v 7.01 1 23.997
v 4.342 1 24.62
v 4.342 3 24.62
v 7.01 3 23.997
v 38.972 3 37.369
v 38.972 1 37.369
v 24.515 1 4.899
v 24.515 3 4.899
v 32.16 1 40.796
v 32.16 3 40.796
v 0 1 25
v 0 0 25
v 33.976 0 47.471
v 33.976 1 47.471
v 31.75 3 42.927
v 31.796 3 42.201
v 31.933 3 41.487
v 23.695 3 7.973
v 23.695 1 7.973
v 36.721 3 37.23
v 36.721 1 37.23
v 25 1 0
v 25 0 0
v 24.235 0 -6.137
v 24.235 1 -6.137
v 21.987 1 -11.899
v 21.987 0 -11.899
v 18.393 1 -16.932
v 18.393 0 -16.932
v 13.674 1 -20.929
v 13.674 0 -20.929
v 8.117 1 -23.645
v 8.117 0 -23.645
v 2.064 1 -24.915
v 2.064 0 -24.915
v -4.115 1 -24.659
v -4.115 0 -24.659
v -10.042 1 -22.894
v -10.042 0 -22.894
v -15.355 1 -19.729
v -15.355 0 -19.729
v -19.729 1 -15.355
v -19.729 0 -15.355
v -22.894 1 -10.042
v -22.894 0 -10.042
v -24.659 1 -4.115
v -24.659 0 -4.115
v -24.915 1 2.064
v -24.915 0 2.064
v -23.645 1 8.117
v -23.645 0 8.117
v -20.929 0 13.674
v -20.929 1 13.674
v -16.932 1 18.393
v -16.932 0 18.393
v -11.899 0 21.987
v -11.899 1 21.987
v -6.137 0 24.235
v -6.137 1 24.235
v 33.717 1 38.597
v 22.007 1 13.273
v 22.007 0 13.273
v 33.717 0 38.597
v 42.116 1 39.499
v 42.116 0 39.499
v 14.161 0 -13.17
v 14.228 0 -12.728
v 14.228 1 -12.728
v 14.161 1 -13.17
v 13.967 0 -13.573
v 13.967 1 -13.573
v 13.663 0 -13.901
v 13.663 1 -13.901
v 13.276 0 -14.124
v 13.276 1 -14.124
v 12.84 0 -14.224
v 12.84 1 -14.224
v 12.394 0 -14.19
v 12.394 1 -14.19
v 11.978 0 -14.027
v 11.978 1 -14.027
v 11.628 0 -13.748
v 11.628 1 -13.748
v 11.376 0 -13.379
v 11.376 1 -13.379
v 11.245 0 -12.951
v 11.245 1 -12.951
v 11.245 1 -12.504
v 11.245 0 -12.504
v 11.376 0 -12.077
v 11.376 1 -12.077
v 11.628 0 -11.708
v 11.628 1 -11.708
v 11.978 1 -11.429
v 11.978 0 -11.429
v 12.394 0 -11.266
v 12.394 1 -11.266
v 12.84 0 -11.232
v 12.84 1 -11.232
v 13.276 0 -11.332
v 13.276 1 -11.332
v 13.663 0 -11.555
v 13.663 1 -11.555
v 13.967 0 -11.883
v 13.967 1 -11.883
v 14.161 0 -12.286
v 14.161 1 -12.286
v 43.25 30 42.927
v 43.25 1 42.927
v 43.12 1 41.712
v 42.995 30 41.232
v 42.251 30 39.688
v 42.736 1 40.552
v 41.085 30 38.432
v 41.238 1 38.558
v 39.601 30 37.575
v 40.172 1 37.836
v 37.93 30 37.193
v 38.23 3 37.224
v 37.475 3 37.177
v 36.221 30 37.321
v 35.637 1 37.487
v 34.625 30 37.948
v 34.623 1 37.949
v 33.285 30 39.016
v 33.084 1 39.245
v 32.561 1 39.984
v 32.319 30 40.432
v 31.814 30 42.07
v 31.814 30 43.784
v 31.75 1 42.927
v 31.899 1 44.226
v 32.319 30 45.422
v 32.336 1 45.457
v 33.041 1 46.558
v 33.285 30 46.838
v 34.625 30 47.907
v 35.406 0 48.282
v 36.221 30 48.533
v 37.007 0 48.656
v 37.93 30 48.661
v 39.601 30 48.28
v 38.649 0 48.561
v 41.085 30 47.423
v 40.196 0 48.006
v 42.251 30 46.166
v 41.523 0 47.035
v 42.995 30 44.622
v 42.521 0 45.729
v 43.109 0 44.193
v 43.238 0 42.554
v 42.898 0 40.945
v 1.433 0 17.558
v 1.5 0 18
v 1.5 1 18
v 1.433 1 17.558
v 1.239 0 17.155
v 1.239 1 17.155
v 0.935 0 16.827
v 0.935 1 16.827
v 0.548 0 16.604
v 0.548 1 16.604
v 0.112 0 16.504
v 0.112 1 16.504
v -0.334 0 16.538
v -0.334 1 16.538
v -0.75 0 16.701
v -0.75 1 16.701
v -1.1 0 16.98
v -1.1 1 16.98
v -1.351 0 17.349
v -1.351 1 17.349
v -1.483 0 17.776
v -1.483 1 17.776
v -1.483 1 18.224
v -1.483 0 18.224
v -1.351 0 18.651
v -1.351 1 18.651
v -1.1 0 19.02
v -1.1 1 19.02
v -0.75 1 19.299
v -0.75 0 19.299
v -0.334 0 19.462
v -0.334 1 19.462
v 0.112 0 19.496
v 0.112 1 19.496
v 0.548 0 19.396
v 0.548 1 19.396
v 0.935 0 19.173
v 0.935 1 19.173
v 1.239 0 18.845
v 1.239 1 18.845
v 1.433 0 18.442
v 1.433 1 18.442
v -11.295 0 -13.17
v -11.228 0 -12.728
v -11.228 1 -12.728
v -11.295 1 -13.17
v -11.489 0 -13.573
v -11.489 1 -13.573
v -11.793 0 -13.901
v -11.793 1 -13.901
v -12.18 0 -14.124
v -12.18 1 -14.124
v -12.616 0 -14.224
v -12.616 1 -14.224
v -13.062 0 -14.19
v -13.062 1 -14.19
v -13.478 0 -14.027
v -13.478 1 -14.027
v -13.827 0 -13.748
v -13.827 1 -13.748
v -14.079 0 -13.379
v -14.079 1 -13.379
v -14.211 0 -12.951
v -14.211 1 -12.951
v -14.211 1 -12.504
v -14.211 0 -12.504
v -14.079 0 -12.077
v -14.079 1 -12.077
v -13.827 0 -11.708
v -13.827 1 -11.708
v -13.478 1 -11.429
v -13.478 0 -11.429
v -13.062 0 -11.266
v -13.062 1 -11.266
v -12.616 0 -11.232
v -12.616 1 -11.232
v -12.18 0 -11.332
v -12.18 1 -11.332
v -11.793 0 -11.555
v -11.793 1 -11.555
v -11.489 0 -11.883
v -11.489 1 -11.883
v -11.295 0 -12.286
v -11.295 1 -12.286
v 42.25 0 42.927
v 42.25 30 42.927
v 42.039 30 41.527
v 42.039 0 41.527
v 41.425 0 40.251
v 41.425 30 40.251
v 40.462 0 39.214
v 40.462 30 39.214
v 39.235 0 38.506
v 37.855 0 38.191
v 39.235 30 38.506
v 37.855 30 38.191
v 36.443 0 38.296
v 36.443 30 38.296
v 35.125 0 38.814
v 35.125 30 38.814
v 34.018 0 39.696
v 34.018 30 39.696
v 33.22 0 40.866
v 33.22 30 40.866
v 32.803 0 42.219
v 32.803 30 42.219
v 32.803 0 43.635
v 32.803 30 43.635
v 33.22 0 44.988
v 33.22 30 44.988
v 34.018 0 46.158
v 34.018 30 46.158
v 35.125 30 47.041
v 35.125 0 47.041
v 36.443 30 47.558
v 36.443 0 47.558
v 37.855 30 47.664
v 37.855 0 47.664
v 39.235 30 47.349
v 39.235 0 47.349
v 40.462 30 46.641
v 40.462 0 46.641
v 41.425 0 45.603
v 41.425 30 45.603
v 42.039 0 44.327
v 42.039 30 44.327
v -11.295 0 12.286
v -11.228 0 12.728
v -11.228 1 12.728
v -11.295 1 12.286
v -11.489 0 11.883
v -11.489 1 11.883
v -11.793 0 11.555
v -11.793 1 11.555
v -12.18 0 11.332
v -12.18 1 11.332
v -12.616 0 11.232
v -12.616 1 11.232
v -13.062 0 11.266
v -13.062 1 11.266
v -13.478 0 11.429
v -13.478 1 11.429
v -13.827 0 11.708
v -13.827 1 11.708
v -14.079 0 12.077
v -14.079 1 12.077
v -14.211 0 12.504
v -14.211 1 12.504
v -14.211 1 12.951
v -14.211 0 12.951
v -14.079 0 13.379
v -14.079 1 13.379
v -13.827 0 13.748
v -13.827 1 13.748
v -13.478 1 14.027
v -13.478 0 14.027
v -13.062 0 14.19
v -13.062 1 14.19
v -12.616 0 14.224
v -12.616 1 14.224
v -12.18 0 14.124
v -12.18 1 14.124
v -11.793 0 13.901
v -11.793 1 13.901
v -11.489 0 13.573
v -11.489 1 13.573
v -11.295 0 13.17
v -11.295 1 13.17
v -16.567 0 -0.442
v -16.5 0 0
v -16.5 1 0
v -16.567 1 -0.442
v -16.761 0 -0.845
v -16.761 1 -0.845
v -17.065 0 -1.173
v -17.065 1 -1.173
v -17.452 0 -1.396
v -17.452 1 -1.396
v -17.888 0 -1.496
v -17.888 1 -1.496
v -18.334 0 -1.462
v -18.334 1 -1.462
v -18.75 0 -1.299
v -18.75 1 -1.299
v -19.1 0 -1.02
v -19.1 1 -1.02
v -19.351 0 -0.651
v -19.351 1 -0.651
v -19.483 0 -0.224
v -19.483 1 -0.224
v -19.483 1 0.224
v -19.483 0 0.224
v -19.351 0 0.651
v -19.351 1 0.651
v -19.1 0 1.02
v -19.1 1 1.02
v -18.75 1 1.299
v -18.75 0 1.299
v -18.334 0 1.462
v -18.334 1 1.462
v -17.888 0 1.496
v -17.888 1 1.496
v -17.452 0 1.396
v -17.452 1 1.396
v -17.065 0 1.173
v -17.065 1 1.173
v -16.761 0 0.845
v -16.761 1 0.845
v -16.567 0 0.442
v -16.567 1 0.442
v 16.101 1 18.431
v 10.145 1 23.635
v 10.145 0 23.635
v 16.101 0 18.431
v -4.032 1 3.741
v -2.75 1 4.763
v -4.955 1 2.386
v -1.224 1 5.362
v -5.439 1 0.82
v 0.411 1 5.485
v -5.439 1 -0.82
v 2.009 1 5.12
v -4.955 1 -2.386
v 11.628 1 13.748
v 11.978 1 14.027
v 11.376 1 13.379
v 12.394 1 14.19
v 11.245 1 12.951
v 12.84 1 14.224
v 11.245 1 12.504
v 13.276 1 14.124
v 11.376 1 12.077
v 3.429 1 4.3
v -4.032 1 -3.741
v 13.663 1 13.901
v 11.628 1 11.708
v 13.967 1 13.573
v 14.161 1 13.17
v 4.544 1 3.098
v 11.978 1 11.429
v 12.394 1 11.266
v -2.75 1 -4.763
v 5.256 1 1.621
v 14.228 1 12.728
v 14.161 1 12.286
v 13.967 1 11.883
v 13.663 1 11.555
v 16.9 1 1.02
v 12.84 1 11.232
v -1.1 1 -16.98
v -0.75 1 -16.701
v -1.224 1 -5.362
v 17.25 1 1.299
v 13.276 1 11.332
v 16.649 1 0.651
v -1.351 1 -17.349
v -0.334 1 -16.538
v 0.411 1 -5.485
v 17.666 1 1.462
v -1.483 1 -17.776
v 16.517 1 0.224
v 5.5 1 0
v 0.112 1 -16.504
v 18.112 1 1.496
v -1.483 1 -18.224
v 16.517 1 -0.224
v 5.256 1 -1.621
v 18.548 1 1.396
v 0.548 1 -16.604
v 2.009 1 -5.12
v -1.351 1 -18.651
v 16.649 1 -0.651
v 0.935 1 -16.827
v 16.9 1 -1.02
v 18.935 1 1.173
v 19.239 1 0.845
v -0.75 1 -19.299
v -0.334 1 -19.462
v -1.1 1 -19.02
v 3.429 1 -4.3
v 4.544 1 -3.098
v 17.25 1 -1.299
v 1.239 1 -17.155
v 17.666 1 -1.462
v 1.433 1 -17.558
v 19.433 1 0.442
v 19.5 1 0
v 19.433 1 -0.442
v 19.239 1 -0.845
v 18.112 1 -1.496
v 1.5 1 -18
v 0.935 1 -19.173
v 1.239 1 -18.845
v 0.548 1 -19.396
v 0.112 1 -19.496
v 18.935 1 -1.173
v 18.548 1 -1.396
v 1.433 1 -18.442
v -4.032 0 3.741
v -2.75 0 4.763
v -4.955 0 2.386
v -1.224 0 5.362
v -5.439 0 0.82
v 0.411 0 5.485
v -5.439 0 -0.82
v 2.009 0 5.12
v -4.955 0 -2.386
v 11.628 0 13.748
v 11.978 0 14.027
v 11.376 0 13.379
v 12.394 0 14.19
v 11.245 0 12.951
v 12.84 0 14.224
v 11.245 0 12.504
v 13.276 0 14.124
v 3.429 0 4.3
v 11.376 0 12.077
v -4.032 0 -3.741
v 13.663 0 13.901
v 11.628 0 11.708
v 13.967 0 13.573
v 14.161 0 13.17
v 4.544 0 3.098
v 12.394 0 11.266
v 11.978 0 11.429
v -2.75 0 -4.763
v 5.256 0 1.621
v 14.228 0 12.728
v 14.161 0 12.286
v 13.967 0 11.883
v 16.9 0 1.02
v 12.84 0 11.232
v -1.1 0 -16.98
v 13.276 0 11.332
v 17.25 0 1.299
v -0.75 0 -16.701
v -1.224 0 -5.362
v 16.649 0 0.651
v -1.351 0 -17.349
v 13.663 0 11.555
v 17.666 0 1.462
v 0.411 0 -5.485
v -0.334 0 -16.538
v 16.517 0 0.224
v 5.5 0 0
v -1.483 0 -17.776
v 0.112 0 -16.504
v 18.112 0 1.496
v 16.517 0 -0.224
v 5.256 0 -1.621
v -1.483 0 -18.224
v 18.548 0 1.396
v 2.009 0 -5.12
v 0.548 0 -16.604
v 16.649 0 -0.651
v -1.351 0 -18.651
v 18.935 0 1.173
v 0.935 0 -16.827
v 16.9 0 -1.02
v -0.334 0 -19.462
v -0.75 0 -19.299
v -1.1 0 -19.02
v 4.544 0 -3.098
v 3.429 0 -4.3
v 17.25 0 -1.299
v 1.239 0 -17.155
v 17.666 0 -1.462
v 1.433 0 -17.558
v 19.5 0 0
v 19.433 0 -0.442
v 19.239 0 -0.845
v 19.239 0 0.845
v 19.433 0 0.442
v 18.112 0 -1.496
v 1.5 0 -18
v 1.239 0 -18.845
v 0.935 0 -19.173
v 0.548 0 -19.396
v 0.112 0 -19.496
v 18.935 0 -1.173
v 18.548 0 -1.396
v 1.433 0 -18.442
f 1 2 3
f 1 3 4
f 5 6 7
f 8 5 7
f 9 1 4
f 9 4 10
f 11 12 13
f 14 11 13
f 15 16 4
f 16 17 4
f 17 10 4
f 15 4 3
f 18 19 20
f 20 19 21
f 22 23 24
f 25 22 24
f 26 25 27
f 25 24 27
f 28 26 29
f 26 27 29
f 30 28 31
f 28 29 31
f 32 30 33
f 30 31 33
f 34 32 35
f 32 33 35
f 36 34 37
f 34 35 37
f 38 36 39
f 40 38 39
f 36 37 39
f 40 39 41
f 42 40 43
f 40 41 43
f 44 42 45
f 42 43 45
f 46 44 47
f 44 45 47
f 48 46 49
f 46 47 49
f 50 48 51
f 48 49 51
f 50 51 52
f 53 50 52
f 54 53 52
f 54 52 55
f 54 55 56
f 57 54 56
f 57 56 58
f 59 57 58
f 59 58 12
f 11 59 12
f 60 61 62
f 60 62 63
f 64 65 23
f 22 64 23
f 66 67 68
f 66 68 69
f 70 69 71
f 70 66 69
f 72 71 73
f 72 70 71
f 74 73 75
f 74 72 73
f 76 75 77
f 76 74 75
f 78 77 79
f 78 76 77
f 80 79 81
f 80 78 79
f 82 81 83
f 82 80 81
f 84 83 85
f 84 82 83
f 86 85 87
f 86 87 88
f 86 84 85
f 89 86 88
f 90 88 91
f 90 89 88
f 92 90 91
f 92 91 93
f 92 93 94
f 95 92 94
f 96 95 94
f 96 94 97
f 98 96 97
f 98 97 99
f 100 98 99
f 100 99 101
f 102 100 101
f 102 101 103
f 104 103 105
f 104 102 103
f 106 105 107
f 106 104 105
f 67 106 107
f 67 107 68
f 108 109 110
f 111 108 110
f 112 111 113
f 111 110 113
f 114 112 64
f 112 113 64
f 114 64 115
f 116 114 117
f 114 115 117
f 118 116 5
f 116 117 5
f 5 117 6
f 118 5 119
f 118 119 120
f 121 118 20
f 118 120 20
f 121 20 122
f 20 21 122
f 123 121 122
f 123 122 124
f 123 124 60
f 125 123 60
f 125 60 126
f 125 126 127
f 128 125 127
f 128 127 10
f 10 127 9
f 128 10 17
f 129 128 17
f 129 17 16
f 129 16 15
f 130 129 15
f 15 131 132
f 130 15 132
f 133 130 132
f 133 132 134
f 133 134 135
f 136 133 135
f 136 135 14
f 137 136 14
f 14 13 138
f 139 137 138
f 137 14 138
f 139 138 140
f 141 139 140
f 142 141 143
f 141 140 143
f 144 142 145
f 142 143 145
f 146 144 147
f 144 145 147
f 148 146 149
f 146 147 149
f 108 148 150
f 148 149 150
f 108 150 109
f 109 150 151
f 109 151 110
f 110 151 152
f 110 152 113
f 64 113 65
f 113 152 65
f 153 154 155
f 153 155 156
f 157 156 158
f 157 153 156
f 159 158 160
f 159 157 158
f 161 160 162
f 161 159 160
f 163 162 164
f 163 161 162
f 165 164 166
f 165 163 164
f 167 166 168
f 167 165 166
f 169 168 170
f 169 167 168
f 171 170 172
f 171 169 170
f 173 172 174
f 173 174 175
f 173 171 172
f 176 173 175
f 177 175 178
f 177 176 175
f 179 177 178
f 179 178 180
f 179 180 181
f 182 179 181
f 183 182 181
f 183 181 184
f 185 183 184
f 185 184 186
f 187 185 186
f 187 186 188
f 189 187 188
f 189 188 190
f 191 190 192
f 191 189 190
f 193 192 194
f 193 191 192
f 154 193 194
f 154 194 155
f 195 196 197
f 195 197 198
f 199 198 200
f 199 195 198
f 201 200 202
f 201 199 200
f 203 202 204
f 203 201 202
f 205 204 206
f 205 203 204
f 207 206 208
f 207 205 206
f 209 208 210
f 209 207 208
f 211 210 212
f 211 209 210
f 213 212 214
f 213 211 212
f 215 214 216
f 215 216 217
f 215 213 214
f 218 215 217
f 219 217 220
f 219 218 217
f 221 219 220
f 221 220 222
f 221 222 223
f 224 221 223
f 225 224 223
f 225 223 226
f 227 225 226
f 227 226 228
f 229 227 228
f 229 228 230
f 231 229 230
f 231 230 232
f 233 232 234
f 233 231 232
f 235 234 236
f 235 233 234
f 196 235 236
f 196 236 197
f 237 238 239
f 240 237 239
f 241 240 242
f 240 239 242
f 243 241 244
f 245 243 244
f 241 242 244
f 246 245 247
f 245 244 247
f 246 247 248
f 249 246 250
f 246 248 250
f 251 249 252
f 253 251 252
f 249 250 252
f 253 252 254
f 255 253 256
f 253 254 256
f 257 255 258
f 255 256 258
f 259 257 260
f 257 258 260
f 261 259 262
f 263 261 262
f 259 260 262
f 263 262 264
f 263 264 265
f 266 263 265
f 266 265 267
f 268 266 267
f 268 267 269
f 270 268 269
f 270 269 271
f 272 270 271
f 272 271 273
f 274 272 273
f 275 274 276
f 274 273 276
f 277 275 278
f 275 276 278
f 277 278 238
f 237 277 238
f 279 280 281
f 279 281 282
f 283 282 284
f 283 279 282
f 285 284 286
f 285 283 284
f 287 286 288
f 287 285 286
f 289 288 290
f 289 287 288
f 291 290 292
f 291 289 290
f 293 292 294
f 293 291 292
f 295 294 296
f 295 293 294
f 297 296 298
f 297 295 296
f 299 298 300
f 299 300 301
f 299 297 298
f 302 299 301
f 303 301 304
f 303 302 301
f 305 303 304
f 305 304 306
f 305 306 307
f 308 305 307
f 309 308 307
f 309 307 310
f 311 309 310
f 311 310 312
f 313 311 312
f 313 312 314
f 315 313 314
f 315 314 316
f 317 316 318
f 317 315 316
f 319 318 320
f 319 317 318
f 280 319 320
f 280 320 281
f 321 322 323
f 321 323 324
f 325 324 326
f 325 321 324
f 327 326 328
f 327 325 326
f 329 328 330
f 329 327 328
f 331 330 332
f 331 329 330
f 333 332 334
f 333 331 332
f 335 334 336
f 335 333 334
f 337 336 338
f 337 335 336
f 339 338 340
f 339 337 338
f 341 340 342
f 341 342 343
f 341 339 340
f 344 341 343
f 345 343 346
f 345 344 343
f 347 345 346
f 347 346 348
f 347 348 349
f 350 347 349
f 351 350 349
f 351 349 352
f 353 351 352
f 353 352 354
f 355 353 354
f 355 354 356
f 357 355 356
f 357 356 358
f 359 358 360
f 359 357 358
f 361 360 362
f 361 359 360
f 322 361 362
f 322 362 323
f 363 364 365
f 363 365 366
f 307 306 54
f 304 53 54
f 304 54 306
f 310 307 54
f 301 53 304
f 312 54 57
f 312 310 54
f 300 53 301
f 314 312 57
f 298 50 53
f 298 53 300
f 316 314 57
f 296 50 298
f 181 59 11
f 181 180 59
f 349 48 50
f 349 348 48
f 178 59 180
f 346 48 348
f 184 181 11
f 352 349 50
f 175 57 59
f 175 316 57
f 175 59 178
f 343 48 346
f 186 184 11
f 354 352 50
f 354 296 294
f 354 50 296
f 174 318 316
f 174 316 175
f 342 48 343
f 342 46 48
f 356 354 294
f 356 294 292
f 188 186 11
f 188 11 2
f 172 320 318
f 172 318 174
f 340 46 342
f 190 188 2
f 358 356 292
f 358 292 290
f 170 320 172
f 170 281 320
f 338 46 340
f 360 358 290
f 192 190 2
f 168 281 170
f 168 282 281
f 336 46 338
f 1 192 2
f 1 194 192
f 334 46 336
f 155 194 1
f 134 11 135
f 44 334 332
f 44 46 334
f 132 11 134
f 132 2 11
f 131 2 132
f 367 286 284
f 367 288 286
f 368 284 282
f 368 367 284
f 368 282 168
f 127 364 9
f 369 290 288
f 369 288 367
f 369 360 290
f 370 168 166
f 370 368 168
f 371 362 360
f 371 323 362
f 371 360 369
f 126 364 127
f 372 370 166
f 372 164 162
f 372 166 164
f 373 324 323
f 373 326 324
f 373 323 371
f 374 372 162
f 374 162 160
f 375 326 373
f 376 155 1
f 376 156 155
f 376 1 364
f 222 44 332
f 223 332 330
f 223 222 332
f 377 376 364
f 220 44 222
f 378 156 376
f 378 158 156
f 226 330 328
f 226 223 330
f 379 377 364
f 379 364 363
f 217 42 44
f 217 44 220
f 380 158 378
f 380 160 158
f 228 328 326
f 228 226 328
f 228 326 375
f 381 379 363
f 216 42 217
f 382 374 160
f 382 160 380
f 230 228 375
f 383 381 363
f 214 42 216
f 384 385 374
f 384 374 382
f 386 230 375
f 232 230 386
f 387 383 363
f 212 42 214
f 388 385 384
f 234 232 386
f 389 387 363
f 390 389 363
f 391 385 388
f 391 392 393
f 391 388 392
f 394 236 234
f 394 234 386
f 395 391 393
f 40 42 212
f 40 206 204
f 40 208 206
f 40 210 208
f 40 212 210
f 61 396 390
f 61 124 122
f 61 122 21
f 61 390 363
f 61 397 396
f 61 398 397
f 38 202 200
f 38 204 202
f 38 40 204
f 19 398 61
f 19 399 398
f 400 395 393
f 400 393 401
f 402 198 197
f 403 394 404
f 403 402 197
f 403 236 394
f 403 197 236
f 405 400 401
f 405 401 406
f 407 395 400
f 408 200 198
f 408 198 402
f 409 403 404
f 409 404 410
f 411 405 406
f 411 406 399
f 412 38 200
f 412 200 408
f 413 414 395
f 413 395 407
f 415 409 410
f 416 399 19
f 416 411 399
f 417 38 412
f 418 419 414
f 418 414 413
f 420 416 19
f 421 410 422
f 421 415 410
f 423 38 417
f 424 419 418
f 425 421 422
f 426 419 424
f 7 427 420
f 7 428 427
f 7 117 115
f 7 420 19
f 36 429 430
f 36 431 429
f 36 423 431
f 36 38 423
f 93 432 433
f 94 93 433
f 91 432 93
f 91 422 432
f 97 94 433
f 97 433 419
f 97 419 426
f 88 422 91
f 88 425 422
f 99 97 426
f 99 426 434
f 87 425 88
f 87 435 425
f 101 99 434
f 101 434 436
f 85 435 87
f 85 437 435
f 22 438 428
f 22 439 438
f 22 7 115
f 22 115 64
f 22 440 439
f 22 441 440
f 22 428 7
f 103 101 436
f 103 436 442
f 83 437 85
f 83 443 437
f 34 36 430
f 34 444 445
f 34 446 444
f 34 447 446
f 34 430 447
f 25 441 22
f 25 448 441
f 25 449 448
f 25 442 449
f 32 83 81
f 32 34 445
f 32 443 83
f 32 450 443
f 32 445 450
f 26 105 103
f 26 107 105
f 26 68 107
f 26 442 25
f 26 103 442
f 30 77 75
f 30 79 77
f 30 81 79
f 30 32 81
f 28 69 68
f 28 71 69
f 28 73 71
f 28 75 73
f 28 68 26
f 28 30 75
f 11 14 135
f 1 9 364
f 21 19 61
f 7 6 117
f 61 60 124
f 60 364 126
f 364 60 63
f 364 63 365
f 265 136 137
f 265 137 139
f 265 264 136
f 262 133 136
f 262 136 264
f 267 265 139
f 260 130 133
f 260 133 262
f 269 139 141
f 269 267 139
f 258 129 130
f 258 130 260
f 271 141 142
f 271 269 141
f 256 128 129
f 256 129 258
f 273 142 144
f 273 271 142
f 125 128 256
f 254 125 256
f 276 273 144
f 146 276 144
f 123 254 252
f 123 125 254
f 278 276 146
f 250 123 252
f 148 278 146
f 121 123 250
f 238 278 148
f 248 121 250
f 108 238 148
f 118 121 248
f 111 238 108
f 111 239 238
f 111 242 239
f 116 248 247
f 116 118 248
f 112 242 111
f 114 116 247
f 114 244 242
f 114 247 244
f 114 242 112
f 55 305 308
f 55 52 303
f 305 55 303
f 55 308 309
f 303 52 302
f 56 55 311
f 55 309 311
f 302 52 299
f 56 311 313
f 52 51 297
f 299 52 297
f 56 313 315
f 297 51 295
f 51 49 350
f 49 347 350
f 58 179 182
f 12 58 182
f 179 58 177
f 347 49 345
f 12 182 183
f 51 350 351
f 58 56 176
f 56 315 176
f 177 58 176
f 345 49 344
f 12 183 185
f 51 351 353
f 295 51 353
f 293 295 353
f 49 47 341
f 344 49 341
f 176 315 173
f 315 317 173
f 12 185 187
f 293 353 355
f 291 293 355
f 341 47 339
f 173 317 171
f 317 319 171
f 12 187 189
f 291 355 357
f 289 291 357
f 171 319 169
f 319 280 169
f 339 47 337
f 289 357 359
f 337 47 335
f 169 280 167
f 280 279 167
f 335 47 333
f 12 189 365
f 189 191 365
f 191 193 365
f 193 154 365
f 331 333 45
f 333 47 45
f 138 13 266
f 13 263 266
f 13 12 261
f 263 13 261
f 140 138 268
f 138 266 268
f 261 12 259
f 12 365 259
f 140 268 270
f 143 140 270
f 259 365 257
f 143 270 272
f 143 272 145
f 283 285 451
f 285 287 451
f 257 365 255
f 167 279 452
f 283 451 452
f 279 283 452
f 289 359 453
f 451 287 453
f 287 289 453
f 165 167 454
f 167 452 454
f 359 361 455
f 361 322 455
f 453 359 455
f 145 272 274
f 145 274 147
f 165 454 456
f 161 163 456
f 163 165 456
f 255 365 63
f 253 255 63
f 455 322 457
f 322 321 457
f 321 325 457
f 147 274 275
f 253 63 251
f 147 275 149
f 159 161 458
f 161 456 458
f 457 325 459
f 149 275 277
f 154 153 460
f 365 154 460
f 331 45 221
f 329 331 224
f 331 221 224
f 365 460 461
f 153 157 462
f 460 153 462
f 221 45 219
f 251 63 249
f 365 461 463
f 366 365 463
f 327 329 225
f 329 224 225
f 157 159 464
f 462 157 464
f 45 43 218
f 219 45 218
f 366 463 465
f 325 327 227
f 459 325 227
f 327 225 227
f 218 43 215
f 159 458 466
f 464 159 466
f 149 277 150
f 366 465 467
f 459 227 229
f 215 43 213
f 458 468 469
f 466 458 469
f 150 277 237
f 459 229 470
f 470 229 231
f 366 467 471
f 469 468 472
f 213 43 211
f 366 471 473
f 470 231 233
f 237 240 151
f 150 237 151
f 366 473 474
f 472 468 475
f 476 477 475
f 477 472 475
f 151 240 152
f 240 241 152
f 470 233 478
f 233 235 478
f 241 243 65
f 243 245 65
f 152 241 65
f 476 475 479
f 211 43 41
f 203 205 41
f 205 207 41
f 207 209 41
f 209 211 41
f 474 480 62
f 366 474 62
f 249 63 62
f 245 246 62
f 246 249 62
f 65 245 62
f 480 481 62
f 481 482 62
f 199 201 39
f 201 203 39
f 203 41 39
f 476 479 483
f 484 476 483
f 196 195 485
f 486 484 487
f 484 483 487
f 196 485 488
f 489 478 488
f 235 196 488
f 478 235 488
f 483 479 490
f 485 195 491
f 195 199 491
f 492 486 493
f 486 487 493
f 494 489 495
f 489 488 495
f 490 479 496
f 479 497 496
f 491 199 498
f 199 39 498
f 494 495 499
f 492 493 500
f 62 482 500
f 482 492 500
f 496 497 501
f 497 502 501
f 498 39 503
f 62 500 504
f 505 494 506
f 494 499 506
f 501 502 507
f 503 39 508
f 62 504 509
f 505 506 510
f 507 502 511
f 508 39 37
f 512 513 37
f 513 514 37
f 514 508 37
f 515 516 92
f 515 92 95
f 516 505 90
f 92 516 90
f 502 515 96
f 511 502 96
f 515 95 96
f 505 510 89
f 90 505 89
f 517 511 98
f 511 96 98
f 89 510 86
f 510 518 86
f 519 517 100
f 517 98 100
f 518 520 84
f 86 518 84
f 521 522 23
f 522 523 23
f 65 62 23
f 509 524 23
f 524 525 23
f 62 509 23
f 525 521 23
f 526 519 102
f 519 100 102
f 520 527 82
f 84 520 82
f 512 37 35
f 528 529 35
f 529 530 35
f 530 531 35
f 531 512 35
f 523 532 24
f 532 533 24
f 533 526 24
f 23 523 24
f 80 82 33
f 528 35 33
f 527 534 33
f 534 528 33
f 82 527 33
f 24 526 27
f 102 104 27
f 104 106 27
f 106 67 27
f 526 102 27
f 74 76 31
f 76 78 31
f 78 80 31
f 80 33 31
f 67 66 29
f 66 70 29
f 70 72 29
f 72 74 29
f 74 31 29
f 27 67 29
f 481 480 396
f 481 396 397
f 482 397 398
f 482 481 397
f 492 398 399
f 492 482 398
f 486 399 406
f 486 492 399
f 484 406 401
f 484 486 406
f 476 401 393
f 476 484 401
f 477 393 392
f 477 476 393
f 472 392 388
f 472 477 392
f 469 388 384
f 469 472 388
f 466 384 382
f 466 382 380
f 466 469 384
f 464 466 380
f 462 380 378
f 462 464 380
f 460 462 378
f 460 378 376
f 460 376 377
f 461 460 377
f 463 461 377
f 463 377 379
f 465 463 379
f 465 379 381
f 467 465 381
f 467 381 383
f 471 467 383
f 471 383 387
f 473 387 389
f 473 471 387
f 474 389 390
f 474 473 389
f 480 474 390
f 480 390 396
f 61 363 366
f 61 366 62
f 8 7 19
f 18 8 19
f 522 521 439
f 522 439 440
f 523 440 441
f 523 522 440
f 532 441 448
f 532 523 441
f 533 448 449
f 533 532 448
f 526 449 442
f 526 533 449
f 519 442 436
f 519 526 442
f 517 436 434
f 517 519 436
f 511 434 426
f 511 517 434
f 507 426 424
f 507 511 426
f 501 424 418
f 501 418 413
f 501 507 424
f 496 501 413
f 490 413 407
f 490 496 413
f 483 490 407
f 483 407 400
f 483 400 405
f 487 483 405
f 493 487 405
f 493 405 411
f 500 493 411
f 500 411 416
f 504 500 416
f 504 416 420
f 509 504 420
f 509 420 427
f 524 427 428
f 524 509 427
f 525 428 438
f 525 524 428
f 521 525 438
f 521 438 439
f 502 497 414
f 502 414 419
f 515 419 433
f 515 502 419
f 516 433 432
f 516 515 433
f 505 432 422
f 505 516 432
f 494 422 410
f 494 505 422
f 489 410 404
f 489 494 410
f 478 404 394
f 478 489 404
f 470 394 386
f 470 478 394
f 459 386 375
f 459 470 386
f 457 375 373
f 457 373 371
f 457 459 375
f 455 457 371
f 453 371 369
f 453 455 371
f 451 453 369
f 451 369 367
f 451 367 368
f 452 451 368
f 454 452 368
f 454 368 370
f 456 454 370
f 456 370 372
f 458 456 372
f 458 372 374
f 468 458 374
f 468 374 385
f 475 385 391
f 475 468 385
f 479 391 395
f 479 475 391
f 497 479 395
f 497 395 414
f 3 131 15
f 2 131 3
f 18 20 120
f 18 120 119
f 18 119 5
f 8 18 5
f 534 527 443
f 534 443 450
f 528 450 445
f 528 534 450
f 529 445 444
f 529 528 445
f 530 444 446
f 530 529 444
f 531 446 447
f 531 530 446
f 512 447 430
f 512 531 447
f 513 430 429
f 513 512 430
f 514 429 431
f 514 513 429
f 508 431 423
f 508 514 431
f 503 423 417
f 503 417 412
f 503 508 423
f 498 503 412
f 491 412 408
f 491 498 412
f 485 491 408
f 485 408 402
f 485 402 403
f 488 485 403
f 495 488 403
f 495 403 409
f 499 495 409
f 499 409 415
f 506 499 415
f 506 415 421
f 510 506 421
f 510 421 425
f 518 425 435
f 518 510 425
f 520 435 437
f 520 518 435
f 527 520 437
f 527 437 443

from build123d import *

# Parameters (mm, degrees)
SKETCH_1_R          = 5.75
EXTRUDE_1_DEPTH     = 1
SKETCH_1_R_2        = 25
SKETCH_1_R_3        = 1.5
SKETCH_1_R_4        = 5.5
EXTRUDE_1_2_DEPTH   = 1
EXTRUDE_2_DEPTH     = 1
SKETCH_3_R          = 5.75
EXTRUDE_3_DEPTH     = 30
CUT_EXTRUDE_1_DEPTH = 30
EXTRUDE_4_DEPTH     = 2
SKETCH_6_R          = 4.75
CUT_EXTRUDE_3_DEPTH = 30


with BuildPart() as part:
    # 草图1 → 凸台-拉伸1 (new body)
    with BuildSketch(Plane(origin=(0, 0, 0), x_dir=(1, 0, 0), z_dir=(0, 1, 0))):
        with Locations((37.5, -42.927264064)):
            Circle(SKETCH_1_R)
    extrude(amount=EXTRUDE_1_DEPTH)



with BuildPart() as body_2:
    # 草图1 → Extrude 1 2 (new body)
    with BuildSketch(Plane(origin=(0, 0, 0), x_dir=(1, 0, 0), z_dir=(0, 1, 0))):
        Circle(SKETCH_1_R_2)
        with Locations((0, -18)):
            Circle(SKETCH_1_R_3, mode=Mode.SUBTRACT)
        with Locations((-12.727922061, -12.727922061)):
            Circle(SKETCH_1_R_3, mode=Mode.SUBTRACT)
        with Locations((-18, 0)):
            Circle(SKETCH_1_R_3, mode=Mode.SUBTRACT)
        with Locations((-12.727922061, 12.727922061)):
            Circle(SKETCH_1_R_3, mode=Mode.SUBTRACT)
        with Locations((0, 18)):
            Circle(SKETCH_1_R_3, mode=Mode.SUBTRACT)
        with Locations((12.727922061, 12.727922061)):
            Circle(SKETCH_1_R_3, mode=Mode.SUBTRACT)
        with Locations((18, 0)):
            Circle(SKETCH_1_R_3, mode=Mode.SUBTRACT)
        with Locations((12.727922061, -12.727922061)):
            Circle(SKETCH_1_R_3, mode=Mode.SUBTRACT)
        Circle(SKETCH_1_R_4, mode=Mode.SUBTRACT)
    extrude(amount=EXTRUDE_1_2_DEPTH)


with BuildPart() as part_1:
    add(part.part)

    add(body_2.part)  # 凸台-拉伸2 merges body 2
    # 草图2 → 凸台-拉伸2 (add)
    with BuildSketch(Plane(origin=(0, 0, 0), x_dir=(1, 0, 0), z_dir=(0, 1, 0))):
        with BuildLine():
            Line((0, -25), (33.976022053, -47.470839685))
            ThreePointArc((33.976022053, -47.470839685), (37.308300147, -42.73151924), (42.116158776, -39.498914876))
            Line((42.116158776, -39.498914876), (25, 0))
            Line((25, 0), (15.739254024, -17.717074967))
            Line((15.739254024, -17.717074967), (0, -25))
        make_face()
    extrude(amount=EXTRUDE_2_DEPTH)

    # 草图3 → 凸台-拉伸3 (add)
    with BuildSketch(Plane(origin=(0, 0, 0), x_dir=(1, 0, 0), z_dir=(0, 1, 0))):
        with Locations((37.5, -42.927264064)):
            Circle(SKETCH_3_R)
    extrude(amount=EXTRUDE_3_DEPTH)

    # 草图4 → 切除-拉伸1 (cut)
    with BuildSketch(Plane(origin=(0, 1, 0), x_dir=(1, 0, 0), z_dir=(0, 1, 0))):
        Polygon((16.101209637, -18.431490076), (22.006815823, -13.272525562), (33.717105263, -38.596882163), (10.14517855, -23.634504306), align=None)
    extrude(amount=-CUT_EXTRUDE_1_DEPTH, mode=Mode.SUBTRACT)

    # 草图5 → 凸台-拉伸4 (add)
    with BuildSketch(Plane(origin=(0, 1, 0), x_dir=(1, 0, 0), z_dir=(0, 1, 0))):
        Polygon((31.75, -42.927264064), (4.342000799, -24.620053393), (7.010063543, -23.99706251), (32.159659881, -40.79576989), align=None)
        Polygon((38.971739634, -37.368803625), (24.515251473, -4.899229044), (23.694530655, -7.973030605), (36.720800315, -37.230304537), align=None)
    extrude(amount=EXTRUDE_4_DEPTH)

    # 草图6 → 切除-拉伸3 (cut)
    with BuildSketch(Plane(origin=(0, 30, 0), x_dir=(1, 0, 0), z_dir=(0, 1, 0))):
        with Locations((37.5, -42.927264064)):
            Circle(SKETCH_6_R)
    extrude(amount=-CUT_EXTRUDE_3_DEPTH, mode=Mode.SUBTRACT)


solid = part_1.part
